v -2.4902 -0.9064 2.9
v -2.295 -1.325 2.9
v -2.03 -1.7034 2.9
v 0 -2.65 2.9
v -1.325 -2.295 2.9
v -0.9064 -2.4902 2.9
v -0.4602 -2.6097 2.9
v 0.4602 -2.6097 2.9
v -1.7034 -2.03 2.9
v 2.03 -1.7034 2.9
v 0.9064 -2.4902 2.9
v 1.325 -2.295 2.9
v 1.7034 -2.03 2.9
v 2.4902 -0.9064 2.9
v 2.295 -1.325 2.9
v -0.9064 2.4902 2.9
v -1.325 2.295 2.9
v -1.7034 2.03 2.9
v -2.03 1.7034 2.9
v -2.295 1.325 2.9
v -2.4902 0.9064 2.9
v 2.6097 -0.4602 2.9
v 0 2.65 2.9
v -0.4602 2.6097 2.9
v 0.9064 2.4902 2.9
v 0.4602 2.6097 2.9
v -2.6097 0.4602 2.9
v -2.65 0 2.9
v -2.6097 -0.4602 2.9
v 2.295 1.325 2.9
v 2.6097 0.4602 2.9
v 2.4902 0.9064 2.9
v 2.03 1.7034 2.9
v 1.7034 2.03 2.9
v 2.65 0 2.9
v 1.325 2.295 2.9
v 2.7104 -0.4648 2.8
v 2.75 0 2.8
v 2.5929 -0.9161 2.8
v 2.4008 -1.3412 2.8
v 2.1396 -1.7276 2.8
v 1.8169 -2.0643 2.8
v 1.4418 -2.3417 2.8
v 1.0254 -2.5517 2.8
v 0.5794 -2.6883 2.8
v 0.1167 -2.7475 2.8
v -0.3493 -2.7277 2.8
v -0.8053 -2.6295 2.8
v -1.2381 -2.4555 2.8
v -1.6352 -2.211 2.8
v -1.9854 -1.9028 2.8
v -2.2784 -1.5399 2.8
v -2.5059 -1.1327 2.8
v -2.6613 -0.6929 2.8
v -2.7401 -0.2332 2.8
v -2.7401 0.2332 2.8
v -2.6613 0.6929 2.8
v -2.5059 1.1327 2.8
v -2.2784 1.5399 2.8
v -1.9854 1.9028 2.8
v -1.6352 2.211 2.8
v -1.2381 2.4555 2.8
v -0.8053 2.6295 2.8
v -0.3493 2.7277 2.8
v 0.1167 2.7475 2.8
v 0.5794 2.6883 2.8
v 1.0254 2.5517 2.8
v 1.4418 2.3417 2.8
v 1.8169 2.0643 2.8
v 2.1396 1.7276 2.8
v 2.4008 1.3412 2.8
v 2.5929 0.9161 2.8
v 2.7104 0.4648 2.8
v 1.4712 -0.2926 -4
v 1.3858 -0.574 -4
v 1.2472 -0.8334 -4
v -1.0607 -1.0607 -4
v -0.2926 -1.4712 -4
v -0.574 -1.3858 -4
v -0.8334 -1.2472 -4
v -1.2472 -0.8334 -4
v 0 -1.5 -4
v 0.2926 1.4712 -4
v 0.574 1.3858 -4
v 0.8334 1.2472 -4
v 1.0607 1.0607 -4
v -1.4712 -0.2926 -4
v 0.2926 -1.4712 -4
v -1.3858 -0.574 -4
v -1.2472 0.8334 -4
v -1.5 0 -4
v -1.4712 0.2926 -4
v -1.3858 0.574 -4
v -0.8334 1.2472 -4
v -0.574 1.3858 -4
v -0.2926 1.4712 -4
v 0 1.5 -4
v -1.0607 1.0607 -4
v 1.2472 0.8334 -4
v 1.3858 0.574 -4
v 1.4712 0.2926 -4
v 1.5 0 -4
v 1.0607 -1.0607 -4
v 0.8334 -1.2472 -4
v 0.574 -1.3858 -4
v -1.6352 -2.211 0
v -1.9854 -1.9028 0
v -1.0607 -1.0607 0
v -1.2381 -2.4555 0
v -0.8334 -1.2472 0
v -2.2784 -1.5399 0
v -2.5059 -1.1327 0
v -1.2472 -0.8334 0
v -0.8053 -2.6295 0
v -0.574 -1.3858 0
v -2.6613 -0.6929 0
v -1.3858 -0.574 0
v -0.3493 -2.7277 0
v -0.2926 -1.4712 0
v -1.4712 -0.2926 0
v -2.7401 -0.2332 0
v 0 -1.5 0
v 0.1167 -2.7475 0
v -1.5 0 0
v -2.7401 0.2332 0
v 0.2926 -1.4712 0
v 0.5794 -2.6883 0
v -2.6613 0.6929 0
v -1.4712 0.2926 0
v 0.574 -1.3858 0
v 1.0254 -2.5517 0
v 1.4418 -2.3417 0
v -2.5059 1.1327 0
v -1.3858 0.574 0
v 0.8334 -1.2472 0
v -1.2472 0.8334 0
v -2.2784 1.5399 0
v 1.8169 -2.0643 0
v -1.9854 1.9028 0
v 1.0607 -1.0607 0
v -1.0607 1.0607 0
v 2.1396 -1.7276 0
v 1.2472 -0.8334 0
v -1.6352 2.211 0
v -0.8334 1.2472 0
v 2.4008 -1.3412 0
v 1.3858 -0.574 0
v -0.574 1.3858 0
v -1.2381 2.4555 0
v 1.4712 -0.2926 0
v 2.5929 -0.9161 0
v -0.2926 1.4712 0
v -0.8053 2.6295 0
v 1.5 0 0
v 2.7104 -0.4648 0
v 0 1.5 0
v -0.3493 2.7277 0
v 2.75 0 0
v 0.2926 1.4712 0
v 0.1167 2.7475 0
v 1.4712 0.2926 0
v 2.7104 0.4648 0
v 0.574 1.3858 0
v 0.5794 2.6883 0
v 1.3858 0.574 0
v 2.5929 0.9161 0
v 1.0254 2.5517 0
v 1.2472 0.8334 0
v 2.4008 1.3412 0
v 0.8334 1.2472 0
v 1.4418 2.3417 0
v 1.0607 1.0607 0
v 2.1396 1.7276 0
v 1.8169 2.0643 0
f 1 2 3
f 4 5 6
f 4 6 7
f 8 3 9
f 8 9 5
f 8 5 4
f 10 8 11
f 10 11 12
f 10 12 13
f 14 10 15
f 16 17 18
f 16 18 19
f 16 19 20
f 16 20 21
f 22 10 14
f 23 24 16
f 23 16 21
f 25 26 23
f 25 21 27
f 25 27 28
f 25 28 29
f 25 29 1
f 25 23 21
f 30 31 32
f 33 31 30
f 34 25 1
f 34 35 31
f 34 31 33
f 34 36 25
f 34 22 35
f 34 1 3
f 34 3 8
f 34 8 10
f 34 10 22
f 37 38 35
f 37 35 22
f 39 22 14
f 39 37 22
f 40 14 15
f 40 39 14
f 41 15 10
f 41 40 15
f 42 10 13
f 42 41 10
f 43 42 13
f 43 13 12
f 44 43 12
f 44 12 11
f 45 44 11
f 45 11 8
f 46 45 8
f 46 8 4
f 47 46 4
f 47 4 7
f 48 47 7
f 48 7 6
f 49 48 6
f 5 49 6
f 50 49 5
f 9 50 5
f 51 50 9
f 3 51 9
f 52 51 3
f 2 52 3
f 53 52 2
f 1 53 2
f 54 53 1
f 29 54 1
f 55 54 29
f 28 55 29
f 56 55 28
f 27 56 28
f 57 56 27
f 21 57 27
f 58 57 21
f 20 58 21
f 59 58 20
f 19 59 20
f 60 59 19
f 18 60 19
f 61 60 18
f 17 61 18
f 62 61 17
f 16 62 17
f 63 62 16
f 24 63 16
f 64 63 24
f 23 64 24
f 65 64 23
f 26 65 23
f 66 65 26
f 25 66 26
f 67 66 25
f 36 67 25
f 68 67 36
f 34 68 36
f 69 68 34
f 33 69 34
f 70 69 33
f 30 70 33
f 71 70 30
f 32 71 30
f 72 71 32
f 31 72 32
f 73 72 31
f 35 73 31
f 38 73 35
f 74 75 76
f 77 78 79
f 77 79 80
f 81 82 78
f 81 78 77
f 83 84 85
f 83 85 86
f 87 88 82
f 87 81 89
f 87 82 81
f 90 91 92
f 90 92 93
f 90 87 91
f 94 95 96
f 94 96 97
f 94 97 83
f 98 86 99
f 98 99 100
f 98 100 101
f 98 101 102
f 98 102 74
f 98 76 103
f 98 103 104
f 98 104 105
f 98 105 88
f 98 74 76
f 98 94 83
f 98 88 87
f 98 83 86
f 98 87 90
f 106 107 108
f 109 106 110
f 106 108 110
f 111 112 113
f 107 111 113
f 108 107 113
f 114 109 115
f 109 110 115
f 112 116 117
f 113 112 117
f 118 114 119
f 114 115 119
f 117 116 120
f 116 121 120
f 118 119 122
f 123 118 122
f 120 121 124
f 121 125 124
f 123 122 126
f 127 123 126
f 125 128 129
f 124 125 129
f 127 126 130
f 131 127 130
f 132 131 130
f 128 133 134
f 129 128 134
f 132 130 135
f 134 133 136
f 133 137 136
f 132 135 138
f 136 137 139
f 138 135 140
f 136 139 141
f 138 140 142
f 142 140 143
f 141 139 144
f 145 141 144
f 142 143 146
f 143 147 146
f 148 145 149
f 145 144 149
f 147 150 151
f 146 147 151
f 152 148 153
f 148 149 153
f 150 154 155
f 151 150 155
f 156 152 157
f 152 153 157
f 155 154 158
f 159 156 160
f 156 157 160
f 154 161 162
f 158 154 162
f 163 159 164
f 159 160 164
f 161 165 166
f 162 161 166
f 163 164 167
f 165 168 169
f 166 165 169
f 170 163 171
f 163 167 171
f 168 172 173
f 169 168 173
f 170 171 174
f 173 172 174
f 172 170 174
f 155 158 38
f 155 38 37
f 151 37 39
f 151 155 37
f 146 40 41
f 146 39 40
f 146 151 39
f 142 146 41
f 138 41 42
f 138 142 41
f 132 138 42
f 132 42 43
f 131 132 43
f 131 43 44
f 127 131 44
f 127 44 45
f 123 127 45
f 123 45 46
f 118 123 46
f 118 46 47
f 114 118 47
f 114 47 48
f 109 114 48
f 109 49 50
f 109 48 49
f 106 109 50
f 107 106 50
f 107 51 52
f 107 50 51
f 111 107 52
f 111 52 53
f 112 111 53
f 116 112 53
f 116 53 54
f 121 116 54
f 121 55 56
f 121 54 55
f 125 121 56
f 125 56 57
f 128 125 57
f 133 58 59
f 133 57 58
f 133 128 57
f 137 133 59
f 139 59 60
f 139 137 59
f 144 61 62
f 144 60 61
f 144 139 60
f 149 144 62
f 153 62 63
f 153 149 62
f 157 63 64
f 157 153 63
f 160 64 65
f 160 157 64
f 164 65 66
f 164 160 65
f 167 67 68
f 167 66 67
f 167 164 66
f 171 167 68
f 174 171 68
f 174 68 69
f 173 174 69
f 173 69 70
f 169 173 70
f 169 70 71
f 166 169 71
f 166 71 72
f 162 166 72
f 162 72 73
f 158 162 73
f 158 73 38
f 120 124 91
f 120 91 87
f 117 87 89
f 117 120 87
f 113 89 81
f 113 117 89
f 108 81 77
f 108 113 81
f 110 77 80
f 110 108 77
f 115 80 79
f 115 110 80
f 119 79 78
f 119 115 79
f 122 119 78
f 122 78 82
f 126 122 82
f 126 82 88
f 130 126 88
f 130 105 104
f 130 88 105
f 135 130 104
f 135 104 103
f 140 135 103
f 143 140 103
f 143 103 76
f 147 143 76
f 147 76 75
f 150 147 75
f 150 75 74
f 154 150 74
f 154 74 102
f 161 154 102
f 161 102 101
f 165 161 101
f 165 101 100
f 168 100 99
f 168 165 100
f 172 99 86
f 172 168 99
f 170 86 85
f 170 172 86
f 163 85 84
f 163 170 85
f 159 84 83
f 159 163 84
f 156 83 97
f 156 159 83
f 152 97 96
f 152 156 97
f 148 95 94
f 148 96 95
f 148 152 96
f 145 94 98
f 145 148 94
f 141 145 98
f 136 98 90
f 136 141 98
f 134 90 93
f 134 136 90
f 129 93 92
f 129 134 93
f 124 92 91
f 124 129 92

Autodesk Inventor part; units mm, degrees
ref_plane "YZ Plane" through (0, 0, 0) normal (1, 0, 0) x (0, 1, 0)
ref_plane "XZ Plane" through (0, 0, 0) normal (0, 1, 0) x (-1, 0, 0)
ref_plane "XY Plane" through (0, 0, 0) normal (0, 0, 1) x (1, 0, 0)
sketch "スケッチ1" plane through (0, 0, 0) normal (0, 0, 1) x (1, 0, 0)
  circle A0 centre (0, 0) radius 2.75
  dimension "d0" = 5.5
extrude "押し出し1" add sketch "スケッチ1" along normal blind 2.9
sketch "スケッチ2" plane through (0, 0, 0) normal (0, 0, -1) x (-1, 0, 0)
  circle A0 centre (0, 0) radius 1.5
  dimension "d3" = 3
extrude "押し出し2" add sketch "スケッチ2" along normal blind 4
chamfer "面取り1" distance 0.1 angle 45 1 edges at (-2.75, 0, 2.9)
thread "ねじ2" size "M3x0.5" class "6g" standard "ANSI Metric M Profile" full length
properties part number "M3×8" material "ステンレス鋼"
